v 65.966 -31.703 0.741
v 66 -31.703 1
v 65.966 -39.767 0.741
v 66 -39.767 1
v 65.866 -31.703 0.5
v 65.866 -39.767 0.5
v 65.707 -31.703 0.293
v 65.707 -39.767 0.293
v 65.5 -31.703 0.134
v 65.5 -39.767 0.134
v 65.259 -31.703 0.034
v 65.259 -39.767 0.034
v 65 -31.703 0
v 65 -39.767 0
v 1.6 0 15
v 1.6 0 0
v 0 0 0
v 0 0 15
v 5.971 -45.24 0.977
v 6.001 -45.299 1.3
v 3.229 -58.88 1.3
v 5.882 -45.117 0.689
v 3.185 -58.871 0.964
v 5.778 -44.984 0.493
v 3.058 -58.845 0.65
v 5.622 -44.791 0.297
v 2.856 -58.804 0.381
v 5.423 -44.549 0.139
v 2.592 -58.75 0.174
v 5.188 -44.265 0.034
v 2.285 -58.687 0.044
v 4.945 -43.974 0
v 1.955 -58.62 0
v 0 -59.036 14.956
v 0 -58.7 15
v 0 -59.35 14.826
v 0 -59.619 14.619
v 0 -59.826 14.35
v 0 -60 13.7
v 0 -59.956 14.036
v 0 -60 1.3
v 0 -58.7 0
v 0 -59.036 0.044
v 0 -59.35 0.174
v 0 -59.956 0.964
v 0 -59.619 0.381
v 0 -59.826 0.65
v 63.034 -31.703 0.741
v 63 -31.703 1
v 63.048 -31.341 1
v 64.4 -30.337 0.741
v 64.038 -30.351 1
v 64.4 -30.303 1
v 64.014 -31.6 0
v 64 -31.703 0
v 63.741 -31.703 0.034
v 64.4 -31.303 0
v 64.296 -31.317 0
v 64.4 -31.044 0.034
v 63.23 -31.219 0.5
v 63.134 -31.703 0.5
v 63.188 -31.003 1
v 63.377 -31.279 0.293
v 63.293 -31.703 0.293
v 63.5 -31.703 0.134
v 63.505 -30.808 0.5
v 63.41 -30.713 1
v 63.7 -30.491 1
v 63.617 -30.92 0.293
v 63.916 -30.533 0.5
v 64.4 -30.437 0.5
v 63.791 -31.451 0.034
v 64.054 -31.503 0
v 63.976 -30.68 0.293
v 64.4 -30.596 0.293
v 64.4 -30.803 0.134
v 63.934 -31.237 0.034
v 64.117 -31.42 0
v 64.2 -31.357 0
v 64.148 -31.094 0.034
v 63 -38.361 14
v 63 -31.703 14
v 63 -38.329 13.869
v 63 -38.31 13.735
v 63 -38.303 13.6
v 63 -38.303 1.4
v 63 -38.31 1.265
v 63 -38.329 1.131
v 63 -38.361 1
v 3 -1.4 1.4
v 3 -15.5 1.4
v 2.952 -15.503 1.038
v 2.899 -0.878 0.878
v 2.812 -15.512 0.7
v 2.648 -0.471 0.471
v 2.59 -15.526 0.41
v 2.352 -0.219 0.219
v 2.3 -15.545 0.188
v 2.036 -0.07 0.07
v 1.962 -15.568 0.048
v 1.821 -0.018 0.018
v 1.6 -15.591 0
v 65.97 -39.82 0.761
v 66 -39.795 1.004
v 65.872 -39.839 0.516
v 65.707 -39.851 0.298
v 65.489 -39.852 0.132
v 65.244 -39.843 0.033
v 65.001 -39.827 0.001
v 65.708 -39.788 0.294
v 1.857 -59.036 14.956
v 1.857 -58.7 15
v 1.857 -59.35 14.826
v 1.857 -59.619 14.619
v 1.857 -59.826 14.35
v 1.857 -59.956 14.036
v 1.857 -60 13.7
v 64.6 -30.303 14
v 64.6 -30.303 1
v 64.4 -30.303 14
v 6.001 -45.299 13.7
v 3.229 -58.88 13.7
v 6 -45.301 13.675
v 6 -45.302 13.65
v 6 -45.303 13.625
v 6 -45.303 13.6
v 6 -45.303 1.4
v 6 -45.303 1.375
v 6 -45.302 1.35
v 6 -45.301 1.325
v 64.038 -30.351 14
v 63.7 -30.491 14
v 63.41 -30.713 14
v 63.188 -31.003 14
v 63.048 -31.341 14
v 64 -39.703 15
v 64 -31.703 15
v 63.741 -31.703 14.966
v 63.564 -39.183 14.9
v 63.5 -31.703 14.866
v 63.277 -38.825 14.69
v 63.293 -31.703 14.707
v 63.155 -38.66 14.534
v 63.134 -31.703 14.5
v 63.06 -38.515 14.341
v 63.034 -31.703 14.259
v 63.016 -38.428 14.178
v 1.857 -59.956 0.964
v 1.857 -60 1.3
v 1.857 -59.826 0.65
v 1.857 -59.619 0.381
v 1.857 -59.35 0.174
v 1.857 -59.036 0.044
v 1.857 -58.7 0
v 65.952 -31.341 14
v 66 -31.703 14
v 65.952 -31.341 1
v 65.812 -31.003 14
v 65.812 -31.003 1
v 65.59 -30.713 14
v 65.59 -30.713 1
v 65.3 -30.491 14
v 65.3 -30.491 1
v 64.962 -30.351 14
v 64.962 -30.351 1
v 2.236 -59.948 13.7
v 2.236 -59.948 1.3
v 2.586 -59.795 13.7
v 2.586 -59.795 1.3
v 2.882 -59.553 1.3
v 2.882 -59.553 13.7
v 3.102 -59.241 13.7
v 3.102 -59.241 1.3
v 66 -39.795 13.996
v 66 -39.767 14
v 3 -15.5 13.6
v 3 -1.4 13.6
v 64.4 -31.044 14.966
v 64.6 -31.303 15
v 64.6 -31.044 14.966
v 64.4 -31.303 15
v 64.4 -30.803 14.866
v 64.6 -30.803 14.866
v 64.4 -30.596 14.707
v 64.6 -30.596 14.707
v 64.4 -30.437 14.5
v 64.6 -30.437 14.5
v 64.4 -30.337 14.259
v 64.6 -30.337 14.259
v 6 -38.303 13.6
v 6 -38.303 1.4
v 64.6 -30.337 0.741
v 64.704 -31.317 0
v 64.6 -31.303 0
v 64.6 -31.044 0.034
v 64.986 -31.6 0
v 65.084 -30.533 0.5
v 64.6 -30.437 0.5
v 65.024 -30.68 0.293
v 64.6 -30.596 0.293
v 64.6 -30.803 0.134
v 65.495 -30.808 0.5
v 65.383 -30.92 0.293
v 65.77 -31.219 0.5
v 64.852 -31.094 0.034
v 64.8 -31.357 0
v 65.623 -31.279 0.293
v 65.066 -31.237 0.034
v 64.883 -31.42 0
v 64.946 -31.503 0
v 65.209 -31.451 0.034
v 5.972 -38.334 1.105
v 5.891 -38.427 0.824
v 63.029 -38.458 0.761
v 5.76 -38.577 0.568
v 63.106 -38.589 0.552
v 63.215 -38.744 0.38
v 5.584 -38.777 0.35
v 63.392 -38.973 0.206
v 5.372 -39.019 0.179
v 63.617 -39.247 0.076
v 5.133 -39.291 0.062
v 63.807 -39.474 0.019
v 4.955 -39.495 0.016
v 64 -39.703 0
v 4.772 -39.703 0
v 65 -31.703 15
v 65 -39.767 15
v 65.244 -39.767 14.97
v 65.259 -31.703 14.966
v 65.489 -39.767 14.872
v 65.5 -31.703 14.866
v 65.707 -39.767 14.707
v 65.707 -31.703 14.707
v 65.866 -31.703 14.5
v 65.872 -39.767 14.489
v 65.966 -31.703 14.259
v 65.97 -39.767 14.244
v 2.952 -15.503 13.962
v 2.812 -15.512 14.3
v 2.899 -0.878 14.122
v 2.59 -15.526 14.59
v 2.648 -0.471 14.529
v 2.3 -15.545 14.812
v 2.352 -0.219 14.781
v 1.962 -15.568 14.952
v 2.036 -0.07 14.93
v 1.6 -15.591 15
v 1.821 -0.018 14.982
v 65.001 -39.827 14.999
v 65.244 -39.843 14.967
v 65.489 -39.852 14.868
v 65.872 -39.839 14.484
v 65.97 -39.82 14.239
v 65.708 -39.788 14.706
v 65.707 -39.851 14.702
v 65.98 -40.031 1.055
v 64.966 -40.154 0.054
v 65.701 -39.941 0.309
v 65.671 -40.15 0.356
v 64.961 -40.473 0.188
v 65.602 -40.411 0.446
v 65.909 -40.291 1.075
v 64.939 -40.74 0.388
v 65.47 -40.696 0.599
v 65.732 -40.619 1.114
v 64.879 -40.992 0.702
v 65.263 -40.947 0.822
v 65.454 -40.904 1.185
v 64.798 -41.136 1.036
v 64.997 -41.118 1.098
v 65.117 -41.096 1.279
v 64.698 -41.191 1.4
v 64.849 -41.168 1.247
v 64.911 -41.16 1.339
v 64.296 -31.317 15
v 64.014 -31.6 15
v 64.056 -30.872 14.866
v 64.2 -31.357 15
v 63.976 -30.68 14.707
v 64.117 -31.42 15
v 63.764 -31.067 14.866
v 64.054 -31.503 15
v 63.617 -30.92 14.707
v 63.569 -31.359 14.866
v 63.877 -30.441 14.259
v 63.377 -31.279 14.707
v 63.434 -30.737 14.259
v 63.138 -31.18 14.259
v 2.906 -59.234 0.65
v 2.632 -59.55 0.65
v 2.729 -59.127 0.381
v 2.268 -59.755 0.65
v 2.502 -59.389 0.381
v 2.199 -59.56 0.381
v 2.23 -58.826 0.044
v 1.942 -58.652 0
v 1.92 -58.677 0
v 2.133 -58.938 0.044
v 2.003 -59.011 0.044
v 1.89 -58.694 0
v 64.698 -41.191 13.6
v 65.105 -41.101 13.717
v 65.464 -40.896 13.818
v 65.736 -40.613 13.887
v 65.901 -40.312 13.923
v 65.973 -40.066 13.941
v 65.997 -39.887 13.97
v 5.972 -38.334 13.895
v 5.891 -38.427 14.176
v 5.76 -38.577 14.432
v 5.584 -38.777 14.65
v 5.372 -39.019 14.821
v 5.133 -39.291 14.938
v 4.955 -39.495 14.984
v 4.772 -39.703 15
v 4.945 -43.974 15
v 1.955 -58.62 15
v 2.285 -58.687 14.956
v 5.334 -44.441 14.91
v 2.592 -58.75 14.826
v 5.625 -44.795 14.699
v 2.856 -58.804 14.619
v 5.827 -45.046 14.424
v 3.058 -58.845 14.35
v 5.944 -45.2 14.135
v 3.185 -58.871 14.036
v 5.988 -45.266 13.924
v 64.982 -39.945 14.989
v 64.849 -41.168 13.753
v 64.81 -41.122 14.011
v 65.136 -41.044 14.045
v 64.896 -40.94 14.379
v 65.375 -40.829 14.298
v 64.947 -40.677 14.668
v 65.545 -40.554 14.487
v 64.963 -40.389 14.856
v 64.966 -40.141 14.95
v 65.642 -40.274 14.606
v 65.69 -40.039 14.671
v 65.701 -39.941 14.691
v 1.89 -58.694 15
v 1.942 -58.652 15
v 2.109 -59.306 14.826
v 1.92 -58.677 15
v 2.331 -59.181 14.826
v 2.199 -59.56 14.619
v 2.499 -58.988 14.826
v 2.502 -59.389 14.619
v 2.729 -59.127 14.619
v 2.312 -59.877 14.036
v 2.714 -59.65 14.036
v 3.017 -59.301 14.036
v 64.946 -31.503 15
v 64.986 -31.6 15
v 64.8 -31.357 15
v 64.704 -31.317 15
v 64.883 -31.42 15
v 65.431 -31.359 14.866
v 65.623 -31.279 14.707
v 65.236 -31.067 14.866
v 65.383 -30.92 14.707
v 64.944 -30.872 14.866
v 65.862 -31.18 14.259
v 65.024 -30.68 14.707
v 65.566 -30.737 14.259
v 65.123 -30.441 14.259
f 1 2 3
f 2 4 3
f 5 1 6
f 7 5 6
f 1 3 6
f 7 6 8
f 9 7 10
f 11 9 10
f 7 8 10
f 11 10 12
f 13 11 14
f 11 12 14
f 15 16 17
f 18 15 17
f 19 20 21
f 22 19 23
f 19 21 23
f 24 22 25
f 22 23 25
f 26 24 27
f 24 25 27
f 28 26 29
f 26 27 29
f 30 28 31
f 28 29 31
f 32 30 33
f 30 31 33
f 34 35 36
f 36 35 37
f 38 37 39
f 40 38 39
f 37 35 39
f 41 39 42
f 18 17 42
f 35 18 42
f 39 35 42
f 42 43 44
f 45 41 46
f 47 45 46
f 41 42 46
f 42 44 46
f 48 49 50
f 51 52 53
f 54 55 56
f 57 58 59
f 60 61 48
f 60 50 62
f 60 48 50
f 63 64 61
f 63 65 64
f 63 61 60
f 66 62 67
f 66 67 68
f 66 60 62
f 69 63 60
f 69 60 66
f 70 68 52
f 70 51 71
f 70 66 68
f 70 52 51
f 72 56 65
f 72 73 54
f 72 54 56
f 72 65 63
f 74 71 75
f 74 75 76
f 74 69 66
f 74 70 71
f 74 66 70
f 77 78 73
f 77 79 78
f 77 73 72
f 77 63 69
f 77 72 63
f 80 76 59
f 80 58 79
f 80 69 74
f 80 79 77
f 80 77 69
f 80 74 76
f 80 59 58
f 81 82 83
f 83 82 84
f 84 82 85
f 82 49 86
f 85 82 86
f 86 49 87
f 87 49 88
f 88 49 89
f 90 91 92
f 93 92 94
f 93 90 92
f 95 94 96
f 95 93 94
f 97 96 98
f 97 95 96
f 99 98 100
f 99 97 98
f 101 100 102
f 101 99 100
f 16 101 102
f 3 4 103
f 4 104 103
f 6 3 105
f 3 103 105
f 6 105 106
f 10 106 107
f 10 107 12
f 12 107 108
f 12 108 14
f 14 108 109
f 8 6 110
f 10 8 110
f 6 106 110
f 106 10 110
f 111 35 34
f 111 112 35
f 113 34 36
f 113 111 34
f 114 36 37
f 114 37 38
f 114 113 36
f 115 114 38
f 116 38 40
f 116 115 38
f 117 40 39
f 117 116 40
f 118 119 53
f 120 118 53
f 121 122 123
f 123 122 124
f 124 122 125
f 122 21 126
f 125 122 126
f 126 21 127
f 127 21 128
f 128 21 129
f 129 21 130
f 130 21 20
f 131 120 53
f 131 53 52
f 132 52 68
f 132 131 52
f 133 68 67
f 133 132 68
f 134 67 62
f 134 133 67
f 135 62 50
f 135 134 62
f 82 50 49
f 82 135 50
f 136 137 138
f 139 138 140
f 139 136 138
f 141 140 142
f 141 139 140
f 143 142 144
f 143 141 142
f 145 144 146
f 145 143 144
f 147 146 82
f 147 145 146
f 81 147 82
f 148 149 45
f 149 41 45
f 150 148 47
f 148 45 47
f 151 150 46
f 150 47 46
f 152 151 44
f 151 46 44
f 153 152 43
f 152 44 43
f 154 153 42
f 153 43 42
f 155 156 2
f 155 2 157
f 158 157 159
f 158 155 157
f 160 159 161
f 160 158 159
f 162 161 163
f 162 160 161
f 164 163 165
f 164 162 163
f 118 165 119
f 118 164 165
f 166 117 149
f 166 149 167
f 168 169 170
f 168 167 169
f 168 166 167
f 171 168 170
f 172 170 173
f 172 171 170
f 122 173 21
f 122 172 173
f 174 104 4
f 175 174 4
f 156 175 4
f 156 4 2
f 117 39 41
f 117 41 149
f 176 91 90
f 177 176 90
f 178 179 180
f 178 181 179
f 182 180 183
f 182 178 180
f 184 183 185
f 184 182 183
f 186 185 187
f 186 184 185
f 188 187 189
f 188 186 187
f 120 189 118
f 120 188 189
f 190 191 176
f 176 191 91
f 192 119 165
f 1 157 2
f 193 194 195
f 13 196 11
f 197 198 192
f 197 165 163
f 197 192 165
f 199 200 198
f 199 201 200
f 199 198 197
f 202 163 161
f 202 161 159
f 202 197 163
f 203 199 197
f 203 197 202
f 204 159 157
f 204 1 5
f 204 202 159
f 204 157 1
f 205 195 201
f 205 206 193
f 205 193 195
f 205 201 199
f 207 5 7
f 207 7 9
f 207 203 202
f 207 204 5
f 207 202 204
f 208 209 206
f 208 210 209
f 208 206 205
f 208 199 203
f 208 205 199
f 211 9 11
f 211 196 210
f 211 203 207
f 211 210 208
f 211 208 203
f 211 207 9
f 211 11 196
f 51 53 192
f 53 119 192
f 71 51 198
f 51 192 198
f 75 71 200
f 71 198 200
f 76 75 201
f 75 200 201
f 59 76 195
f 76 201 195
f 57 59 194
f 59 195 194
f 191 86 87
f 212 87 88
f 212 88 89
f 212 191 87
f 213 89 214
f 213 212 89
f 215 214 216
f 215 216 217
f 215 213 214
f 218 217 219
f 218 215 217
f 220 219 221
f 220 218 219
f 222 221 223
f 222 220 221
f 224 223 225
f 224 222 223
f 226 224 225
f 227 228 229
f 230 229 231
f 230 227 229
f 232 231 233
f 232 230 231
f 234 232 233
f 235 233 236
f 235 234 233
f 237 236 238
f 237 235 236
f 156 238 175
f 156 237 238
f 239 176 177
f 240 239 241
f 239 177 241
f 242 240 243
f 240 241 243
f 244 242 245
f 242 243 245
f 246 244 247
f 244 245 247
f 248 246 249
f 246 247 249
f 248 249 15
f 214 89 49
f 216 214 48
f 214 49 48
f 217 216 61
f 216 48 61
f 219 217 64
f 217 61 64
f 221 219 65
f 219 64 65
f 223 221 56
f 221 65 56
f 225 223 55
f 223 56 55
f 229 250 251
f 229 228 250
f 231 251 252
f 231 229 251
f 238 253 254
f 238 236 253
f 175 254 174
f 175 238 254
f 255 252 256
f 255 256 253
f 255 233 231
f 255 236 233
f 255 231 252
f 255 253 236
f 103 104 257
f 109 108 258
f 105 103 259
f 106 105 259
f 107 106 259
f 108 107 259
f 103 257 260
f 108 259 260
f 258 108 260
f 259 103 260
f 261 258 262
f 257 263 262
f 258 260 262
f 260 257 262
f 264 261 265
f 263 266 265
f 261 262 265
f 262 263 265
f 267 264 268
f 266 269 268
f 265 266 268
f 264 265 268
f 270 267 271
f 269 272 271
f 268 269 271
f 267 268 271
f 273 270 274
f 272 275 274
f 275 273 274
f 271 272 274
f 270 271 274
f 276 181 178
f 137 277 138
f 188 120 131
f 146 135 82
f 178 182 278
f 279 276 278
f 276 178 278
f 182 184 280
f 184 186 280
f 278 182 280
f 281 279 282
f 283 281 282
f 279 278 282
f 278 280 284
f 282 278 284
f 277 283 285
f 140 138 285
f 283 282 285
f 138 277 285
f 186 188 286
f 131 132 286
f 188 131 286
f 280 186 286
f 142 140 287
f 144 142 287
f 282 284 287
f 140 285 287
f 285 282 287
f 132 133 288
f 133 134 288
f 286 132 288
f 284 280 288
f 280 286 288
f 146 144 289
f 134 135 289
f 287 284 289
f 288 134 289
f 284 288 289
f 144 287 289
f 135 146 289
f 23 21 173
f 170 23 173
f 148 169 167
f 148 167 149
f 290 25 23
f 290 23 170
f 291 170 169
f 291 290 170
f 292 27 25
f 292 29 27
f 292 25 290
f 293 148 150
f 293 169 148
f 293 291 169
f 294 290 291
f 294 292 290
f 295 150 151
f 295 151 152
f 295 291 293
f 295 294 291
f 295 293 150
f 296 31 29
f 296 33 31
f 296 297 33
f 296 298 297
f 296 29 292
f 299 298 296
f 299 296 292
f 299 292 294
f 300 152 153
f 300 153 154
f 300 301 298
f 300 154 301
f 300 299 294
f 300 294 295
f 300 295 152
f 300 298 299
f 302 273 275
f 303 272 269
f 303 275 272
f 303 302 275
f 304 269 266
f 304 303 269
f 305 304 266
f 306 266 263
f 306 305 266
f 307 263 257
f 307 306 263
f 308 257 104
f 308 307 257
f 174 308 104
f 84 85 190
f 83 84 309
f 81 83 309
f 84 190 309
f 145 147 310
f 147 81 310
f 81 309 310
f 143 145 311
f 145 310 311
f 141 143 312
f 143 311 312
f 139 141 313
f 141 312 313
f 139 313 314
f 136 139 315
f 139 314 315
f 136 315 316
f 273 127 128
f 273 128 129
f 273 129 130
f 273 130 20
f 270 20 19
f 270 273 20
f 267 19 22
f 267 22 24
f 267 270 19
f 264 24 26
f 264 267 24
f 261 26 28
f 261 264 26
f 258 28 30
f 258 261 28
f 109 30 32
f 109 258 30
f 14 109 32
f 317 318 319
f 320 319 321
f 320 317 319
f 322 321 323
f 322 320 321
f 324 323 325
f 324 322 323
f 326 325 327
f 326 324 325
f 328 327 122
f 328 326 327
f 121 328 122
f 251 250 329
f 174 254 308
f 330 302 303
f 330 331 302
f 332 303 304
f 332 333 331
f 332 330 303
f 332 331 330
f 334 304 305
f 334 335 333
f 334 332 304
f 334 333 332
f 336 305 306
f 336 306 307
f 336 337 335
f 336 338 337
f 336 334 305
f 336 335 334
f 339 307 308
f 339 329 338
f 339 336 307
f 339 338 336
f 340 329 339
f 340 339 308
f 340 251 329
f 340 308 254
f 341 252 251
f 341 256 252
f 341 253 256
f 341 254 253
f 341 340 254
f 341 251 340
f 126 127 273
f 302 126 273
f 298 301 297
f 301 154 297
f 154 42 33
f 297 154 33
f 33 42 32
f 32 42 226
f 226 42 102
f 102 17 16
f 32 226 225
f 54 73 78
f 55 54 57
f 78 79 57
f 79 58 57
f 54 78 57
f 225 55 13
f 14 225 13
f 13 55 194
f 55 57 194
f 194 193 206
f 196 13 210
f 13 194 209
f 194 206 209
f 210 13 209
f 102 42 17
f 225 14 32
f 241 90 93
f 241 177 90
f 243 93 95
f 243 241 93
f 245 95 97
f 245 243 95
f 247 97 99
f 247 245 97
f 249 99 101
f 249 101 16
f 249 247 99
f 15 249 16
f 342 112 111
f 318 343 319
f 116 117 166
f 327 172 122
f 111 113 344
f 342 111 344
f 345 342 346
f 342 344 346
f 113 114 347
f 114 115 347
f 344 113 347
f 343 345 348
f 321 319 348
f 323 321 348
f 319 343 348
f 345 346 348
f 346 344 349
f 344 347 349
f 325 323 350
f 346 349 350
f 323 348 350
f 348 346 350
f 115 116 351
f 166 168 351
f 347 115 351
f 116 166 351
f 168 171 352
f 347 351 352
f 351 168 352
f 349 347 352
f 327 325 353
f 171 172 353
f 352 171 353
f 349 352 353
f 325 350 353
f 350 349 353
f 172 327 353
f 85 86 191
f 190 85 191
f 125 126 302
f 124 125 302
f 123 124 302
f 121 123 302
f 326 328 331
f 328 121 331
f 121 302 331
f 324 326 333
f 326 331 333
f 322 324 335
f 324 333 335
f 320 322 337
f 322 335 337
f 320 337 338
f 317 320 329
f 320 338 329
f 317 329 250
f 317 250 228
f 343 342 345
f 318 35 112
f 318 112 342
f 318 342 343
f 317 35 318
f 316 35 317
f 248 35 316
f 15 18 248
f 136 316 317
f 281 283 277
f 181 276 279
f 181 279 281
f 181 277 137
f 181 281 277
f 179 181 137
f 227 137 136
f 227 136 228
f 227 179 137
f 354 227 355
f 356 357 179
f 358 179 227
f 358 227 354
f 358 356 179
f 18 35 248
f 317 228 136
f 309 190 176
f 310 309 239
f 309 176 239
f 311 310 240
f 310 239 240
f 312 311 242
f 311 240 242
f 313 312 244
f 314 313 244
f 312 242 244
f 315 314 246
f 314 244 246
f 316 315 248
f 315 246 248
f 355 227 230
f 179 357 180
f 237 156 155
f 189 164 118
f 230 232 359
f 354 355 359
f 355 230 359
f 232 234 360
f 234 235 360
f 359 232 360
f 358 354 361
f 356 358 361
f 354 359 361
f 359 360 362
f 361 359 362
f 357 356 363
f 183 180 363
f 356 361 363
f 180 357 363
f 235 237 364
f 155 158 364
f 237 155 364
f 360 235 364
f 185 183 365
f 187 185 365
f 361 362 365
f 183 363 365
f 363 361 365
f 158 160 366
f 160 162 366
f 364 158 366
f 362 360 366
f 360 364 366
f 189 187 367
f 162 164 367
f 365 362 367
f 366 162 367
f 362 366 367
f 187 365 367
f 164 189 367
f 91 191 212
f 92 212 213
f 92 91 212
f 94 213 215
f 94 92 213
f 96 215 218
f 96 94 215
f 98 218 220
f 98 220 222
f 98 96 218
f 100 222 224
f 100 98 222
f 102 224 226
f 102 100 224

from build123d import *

# Parameters (mm, degrees)
PAD_DEPTH   = 15
FILLET_R    = 1.4
FILLET001_R = 1
FILLET002_R = 1.3


with BuildPart() as part:
    # Sketch → Pad (new body)
    with BuildSketch(Plane.XY):
        Polygon((0, 0), (0, -60), (3, -60), (6, -45.303062), (66, -41.100273), (66, -30.303062), (63, -30.303062), (63, -38.303062), (6, -38.303062), (3, -15.499553), (3, 0), align=None)
    extrude(amount=PAD_DEPTH)

    # Fillet
    fillet_edges = [part.edges().sort_by_distance(p)[0] for p in [
        (34.5, -38.303062, 15),
        (4.5, -26.901307, 15),
        (3, -7.749777, 15),
        (3, -7.749777, 0),
        (4.5, -26.901307, 0),
        (34.5, -38.303062, 0),
        (63, -30.303062, 7.5),
        (66, -30.303062, 7.5),
        (66, -41.100273, 7.5),
        (3, -60, 7.5),
        (3, 0, 7.5),
        (36, -43.201667, 0),
        (36, -43.201667, 15),
    ]]
    fillet(fillet_edges, radius=FILLET_R)

    # Fillet001
    fillet001_edges = [part.edges().sort_by_distance(p)[0] for p in [
        (63, -35.003062, 0),
        (63, -35.003062, 15),
    ]]
    fillet(fillet001_edges, radius=FILLET001_R)

    # Fillet002
    fillet002_edges = [part.edges().sort_by_distance(p)[0] for p in [
        (4.61431, -52.091531, 15),
        (4.61431, -52.091531, 0),
    ]]
    fillet(fillet002_edges, radius=FILLET002_R)


solid = part.part
